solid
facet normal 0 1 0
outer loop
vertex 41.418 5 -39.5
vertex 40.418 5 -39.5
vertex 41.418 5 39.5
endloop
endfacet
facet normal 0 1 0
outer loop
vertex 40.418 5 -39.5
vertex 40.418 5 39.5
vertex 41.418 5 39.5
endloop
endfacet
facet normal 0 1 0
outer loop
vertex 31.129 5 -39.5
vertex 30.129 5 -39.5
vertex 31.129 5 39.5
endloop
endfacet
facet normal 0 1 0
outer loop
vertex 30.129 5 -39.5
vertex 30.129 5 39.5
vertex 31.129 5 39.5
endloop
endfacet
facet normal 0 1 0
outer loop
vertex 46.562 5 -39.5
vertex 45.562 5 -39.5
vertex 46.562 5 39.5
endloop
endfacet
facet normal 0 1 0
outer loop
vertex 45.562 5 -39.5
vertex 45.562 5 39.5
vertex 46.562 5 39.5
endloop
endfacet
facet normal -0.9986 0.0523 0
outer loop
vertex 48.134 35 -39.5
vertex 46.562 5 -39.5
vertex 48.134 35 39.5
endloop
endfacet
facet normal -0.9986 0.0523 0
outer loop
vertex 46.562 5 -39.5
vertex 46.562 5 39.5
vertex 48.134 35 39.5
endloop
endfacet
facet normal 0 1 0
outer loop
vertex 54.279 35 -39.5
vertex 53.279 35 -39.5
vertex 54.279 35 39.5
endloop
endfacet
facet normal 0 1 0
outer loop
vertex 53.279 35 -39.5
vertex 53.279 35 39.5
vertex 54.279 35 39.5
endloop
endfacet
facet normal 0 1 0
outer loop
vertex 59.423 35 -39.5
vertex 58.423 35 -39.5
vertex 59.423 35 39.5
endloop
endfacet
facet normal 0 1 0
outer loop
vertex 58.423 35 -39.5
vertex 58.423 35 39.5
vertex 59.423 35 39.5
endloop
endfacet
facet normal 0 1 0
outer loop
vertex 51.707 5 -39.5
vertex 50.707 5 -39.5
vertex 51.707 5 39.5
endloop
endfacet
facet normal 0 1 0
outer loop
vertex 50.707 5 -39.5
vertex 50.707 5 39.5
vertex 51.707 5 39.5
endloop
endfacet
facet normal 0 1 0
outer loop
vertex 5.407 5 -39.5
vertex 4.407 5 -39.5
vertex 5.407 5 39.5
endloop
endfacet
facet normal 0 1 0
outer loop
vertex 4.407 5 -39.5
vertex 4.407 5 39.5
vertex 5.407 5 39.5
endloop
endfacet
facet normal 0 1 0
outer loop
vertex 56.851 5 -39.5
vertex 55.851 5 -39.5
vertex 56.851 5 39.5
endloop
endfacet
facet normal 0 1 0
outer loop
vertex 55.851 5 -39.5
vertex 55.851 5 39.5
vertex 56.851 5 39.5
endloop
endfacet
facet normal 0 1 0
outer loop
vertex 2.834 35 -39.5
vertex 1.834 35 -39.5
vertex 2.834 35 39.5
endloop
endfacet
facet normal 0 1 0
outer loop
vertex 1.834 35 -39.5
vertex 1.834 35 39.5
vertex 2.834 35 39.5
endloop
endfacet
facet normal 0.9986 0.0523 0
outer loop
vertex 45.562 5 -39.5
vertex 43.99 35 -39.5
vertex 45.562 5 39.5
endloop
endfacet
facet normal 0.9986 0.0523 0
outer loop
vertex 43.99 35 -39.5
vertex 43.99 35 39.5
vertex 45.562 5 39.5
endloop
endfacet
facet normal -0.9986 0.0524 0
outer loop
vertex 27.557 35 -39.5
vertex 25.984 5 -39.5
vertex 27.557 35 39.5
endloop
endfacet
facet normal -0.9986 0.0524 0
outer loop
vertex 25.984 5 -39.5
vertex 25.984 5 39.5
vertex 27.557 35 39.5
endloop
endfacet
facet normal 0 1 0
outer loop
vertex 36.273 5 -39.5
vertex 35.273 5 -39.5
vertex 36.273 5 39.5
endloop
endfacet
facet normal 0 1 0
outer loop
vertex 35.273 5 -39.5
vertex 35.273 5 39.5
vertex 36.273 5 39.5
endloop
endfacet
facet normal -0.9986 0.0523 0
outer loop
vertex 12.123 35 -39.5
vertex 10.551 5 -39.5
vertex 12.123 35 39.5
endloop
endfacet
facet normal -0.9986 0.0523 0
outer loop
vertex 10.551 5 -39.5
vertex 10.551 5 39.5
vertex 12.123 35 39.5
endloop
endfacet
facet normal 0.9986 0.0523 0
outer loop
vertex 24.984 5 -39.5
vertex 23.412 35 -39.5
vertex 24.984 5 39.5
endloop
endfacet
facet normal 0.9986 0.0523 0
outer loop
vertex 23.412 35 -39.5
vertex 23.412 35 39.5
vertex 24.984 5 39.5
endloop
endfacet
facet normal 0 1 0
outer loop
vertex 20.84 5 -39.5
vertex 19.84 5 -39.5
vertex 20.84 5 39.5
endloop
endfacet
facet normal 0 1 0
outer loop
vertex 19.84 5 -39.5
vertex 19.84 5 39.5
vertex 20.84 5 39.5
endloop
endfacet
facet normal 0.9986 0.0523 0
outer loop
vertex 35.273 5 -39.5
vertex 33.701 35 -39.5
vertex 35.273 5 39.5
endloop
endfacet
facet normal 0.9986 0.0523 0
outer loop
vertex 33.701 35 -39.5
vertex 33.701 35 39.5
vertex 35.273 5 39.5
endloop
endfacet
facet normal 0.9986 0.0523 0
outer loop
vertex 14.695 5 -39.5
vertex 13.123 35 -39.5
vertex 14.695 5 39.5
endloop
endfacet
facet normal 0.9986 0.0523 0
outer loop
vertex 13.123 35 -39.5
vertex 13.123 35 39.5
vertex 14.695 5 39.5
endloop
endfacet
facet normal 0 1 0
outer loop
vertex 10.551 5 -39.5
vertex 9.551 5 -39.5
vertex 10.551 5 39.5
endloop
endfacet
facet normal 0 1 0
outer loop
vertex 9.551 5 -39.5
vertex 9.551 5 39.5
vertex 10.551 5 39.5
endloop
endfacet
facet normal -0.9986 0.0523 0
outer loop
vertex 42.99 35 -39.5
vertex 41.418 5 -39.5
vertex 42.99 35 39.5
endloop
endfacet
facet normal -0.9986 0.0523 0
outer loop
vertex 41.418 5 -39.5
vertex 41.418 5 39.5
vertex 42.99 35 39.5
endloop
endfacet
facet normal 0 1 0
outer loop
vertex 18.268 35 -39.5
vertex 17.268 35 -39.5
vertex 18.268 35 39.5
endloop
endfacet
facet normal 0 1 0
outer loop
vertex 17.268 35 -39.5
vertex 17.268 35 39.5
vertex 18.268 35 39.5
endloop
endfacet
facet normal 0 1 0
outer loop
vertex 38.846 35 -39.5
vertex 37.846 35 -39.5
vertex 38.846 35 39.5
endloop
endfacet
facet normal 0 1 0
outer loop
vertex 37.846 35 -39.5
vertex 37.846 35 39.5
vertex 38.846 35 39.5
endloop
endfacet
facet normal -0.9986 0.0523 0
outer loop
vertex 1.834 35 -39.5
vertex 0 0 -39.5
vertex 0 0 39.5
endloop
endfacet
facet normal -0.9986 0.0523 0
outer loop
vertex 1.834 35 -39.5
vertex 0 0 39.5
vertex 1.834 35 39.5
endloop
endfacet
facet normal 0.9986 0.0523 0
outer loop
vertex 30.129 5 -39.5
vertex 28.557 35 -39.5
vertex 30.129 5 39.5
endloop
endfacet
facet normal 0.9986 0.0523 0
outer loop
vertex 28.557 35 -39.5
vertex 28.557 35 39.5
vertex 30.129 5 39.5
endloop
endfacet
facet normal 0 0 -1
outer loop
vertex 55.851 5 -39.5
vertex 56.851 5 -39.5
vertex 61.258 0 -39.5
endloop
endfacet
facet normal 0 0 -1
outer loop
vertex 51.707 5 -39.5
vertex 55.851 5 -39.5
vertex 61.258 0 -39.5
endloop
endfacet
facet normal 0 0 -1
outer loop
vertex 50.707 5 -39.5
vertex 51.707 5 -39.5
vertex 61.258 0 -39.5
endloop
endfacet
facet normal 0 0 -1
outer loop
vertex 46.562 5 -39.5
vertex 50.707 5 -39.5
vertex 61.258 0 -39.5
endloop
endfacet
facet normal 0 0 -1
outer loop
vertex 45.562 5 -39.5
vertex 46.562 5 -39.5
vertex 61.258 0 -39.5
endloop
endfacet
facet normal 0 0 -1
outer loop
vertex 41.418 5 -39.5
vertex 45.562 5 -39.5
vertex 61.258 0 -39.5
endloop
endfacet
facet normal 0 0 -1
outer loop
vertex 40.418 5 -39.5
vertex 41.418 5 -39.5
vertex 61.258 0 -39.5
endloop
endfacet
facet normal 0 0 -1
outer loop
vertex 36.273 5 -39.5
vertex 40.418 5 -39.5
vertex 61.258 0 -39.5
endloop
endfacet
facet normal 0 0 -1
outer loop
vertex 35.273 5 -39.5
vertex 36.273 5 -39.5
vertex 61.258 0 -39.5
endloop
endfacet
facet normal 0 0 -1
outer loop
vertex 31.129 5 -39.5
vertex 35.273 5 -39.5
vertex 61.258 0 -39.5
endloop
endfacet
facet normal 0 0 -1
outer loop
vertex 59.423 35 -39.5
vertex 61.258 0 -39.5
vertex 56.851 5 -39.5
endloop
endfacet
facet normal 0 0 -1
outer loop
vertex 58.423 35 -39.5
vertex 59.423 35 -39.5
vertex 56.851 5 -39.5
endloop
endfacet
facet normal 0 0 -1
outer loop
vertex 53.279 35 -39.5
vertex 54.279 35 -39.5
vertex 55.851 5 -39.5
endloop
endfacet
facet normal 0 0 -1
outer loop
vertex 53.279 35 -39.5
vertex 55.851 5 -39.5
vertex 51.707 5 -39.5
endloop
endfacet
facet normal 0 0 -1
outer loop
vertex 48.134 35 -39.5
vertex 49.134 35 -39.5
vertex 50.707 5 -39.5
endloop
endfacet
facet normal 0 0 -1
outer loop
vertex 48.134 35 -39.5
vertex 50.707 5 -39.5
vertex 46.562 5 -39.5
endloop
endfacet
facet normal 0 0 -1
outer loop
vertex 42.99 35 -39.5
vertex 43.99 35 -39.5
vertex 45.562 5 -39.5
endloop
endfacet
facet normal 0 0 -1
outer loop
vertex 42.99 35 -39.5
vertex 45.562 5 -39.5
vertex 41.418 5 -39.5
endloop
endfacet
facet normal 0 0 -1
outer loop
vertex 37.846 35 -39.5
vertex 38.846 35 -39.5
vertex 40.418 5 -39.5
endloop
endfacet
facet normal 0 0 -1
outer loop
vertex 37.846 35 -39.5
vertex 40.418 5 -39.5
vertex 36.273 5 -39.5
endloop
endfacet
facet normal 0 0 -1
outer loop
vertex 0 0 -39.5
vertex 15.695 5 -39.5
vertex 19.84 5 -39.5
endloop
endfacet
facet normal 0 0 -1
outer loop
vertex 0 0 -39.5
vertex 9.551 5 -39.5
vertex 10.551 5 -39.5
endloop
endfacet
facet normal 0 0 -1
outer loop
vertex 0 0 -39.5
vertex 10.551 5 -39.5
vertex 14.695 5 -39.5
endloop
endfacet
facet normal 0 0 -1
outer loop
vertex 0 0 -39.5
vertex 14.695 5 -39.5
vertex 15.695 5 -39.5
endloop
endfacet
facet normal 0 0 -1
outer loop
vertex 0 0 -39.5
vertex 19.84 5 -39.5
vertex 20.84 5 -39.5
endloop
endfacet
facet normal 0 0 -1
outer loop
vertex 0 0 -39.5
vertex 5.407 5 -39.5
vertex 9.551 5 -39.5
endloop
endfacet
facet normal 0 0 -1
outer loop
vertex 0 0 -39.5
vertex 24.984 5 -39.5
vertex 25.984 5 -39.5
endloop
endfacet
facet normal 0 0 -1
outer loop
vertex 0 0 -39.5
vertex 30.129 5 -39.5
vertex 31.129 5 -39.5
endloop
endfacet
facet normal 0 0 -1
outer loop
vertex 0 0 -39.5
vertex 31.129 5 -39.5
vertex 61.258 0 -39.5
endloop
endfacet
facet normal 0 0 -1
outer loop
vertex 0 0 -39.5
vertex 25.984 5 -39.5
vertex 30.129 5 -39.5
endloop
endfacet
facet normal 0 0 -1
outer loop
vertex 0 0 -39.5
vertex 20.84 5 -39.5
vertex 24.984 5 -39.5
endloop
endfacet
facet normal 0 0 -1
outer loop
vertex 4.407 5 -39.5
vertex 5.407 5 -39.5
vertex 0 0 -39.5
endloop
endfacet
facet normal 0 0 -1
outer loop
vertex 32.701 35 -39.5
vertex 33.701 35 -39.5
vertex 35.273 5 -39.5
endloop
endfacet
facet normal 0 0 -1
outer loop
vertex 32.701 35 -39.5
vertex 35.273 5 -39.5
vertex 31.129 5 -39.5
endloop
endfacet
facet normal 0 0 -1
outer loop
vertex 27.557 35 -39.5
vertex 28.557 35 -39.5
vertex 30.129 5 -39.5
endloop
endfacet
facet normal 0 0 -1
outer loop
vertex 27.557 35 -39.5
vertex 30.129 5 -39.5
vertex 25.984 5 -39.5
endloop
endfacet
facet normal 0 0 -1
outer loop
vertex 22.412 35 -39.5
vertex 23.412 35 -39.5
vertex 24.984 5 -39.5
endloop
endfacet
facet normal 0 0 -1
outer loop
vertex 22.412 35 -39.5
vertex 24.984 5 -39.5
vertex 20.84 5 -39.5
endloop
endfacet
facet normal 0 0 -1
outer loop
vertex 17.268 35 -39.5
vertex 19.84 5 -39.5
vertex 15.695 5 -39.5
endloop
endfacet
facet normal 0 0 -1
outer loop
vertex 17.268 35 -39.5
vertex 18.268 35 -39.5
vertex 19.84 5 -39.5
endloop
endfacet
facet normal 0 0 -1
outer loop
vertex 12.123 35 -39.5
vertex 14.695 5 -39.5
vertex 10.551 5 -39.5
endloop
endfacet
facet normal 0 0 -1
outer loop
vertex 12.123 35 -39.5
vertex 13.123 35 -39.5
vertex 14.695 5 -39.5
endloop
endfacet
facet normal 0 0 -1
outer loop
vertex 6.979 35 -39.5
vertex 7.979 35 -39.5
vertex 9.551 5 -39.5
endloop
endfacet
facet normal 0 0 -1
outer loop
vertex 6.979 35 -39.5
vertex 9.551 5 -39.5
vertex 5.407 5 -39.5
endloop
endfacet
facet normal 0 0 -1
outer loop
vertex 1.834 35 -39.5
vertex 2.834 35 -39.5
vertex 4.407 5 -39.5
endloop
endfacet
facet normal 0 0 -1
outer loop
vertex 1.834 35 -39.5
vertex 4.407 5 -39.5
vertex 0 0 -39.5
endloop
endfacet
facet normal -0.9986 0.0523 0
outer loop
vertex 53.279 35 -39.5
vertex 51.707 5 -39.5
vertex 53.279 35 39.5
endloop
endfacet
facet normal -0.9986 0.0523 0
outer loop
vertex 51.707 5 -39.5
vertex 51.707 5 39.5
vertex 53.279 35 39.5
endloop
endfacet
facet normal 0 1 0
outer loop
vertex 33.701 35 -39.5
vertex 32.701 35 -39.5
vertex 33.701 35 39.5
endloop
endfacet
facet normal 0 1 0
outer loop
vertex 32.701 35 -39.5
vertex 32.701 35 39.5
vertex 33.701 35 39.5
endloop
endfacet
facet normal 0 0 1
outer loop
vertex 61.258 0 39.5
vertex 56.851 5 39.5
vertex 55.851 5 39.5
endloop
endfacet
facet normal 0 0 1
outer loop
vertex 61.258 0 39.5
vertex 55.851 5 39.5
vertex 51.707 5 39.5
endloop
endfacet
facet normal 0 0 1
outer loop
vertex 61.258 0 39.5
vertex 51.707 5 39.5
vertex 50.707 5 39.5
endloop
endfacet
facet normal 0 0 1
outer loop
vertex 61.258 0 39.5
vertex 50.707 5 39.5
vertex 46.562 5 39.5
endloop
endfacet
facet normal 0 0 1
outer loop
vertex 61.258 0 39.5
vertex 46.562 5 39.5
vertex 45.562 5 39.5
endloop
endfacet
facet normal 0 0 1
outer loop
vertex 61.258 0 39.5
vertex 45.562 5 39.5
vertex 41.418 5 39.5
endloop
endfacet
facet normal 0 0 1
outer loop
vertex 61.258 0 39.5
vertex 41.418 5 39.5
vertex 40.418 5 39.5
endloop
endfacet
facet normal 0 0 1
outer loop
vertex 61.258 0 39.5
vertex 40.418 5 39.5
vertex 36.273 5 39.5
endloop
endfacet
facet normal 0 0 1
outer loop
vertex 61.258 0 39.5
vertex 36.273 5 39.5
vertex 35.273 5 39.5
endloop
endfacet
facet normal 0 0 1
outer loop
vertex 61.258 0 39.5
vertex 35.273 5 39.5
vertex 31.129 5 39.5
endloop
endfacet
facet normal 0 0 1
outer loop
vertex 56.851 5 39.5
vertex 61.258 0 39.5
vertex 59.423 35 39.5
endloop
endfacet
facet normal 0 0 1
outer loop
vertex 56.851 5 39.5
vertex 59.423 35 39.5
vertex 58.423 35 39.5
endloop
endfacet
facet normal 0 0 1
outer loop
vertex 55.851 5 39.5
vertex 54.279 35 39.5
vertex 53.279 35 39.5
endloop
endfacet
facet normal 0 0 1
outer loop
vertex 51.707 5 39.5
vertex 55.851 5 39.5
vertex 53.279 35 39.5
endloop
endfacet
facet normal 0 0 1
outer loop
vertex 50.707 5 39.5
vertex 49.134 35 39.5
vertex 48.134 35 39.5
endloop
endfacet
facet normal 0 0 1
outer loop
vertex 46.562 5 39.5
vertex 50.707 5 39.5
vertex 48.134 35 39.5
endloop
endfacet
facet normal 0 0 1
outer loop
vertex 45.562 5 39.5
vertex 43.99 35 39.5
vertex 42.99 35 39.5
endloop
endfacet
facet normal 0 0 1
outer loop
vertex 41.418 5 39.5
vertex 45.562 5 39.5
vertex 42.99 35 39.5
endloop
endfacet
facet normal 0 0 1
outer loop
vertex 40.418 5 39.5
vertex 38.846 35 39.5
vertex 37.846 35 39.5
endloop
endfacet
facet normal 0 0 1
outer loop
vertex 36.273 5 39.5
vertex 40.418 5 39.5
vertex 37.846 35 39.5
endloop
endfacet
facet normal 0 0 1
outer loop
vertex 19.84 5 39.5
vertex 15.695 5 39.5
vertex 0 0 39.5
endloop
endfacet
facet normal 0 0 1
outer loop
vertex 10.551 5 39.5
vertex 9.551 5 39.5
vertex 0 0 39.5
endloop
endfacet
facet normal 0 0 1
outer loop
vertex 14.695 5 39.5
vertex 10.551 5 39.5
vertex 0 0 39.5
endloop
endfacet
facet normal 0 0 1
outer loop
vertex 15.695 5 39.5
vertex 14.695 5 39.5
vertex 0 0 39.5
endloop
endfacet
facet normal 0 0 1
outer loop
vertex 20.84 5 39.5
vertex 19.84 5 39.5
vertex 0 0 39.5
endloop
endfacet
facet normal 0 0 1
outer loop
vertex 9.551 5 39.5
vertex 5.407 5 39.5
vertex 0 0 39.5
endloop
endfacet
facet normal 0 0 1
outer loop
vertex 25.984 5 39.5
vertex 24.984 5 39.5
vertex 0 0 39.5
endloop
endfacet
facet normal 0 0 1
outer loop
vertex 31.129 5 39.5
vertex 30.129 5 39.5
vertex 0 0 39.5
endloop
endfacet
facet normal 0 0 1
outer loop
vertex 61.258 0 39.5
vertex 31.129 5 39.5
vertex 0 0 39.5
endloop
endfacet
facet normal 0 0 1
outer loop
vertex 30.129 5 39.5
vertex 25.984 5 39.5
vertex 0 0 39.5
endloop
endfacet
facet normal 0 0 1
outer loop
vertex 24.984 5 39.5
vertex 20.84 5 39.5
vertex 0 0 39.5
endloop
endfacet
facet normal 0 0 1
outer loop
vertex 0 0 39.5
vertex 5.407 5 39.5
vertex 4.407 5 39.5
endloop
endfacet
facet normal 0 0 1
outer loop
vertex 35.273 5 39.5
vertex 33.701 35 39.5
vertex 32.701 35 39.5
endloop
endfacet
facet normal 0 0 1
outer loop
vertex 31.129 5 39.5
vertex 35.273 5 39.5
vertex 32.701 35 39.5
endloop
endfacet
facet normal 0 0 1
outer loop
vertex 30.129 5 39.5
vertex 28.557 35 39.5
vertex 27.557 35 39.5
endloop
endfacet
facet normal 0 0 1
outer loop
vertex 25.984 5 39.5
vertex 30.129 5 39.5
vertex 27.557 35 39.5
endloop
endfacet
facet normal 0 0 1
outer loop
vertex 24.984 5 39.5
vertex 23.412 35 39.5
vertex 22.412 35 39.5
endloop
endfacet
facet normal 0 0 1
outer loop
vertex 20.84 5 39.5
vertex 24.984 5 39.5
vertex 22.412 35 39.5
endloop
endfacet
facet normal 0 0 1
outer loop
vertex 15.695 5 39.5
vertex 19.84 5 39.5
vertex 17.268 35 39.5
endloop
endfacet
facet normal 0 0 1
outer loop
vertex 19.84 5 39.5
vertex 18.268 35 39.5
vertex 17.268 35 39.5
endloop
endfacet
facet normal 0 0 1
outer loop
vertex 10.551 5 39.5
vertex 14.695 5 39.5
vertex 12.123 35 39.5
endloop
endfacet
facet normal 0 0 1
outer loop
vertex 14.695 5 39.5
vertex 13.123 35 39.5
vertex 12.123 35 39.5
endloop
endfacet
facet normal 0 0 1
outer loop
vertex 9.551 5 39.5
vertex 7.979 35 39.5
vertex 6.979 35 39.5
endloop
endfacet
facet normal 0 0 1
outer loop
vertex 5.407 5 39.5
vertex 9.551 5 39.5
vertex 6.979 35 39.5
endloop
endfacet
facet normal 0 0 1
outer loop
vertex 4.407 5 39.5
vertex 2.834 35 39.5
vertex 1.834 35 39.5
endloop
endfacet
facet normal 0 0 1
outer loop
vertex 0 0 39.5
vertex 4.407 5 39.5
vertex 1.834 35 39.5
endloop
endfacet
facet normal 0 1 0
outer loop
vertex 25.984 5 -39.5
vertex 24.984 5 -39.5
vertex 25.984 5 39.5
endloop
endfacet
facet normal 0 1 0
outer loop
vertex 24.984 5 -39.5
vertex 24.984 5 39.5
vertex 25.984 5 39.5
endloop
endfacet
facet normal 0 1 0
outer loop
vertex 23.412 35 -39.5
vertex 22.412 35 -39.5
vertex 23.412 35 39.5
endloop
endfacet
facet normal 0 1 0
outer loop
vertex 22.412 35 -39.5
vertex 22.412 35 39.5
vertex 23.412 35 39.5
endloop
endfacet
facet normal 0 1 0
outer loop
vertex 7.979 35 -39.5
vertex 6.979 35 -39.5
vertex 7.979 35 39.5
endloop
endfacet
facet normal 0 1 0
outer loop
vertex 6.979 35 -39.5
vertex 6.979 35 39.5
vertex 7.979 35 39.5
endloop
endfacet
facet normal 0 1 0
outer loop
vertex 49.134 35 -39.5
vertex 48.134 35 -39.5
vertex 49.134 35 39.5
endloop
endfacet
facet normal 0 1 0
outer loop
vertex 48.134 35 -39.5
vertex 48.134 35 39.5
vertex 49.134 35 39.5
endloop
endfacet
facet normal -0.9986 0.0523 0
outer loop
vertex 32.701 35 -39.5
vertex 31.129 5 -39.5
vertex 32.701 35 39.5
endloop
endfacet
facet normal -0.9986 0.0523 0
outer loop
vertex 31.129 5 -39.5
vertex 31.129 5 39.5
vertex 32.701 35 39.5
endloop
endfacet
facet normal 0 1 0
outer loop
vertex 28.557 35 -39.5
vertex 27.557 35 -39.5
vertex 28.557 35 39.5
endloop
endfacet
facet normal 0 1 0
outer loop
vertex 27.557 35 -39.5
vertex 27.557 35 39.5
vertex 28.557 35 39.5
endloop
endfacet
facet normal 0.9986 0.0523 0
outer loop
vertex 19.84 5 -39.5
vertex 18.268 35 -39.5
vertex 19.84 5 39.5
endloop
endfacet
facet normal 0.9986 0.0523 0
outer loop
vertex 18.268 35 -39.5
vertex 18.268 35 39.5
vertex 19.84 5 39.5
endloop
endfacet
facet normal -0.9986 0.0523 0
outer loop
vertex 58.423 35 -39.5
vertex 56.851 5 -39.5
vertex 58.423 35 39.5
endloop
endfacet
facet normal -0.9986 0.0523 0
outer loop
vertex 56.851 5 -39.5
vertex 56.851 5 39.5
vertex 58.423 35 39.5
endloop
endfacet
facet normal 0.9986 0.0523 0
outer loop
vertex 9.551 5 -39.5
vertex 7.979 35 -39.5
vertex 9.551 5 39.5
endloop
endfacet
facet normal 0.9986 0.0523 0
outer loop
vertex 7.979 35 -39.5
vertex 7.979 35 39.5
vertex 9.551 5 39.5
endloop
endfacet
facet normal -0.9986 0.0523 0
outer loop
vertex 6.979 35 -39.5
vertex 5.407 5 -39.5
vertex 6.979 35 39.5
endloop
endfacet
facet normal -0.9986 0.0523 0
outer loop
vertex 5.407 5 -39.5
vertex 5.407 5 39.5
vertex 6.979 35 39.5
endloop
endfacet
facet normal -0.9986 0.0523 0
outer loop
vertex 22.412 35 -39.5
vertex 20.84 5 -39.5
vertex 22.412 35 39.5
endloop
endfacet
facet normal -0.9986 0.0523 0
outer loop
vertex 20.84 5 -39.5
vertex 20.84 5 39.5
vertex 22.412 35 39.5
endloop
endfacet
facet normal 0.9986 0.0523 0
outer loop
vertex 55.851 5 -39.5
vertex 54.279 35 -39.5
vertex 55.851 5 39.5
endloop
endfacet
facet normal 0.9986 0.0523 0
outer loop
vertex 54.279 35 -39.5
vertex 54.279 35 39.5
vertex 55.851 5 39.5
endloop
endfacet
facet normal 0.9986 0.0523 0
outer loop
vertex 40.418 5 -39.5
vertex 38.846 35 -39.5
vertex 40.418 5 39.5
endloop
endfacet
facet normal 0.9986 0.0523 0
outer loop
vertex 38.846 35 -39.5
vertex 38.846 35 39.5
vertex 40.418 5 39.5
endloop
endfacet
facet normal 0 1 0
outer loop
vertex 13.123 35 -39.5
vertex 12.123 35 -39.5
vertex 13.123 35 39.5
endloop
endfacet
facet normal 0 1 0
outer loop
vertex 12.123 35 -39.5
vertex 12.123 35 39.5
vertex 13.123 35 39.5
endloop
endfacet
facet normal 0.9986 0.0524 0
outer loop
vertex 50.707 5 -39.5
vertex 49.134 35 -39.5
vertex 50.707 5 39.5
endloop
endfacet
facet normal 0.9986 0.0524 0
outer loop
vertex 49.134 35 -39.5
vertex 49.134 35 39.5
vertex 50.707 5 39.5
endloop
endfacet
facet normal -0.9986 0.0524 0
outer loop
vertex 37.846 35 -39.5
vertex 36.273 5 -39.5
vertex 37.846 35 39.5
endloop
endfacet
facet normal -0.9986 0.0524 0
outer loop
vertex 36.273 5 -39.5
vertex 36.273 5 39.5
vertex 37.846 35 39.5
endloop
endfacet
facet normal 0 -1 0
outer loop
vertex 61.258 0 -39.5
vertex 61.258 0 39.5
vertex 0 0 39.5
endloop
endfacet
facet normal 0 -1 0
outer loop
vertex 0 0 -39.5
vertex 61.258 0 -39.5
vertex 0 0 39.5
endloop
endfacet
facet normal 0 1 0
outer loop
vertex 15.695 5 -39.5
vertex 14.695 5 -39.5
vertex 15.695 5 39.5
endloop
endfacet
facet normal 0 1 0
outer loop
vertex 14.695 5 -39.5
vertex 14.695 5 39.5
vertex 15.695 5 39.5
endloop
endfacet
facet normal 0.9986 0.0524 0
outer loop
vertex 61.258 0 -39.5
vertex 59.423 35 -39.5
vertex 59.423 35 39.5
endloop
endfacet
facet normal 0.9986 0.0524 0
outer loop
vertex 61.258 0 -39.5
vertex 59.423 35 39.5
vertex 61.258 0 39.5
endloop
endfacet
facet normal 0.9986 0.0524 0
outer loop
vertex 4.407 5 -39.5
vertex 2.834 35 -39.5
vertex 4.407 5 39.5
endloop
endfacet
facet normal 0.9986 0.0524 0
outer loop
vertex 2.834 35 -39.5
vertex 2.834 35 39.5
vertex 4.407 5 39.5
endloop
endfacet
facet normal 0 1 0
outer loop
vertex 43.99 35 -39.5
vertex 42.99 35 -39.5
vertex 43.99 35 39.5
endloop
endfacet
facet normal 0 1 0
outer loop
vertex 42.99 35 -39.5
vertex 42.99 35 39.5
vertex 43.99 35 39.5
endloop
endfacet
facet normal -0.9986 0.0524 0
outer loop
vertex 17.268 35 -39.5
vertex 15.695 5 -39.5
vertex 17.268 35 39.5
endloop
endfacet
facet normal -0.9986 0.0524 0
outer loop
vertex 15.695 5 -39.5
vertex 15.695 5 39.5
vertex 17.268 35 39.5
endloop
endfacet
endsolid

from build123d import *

# Parameters (mm, degrees)
BOSS_EXTRUDE1_DEPTH = 39.5


with BuildPart() as part:
    # Sketch1 → Boss-Extrude1 (new, symmetric)
    with BuildSketch(Plane.XY):
        Polygon((0, 0), (1.834272275, 35), (2.834272275, 35), (4.406505653, 5), (5.406505653, 5), (6.978739032, 35), (7.978739032, 35), (9.55097241, 5), (10.55097241, 5), (12.123205789, 35), (13.123205789, 35), (14.695439167, 5), (15.695439167, 5), (17.267672546, 35), (18.267672546, 35), (19.839905924, 5), (20.839905924, 5), (22.412139303, 35), (23.412139303, 35), (24.984372681, 5), (25.984372681, 5), (27.55660606, 35), (28.55660606, 35), (30.128839438, 5), (31.128839438, 5), (32.701072817, 35), (33.701072817, 35), (35.273306195, 5), (36.273306195, 5), (37.845539574, 35), (38.845539574, 35), (40.417772952, 5), (41.417772952, 5), (42.990006331, 35), (43.990006331, 35), (45.562239709, 5), (46.562239709, 5), (48.134473088, 35), (49.134473088, 35), (50.706706466, 5), (51.706706466, 5), (53.278939845, 35), (54.278939845, 35), (55.851173223, 5), (56.851173223, 5), (58.423406602, 35), (59.423406602, 35), (61.257678877, 0), align=None)
    extrude(amount=BOSS_EXTRUDE1_DEPTH, both=True)


solid = part.part
